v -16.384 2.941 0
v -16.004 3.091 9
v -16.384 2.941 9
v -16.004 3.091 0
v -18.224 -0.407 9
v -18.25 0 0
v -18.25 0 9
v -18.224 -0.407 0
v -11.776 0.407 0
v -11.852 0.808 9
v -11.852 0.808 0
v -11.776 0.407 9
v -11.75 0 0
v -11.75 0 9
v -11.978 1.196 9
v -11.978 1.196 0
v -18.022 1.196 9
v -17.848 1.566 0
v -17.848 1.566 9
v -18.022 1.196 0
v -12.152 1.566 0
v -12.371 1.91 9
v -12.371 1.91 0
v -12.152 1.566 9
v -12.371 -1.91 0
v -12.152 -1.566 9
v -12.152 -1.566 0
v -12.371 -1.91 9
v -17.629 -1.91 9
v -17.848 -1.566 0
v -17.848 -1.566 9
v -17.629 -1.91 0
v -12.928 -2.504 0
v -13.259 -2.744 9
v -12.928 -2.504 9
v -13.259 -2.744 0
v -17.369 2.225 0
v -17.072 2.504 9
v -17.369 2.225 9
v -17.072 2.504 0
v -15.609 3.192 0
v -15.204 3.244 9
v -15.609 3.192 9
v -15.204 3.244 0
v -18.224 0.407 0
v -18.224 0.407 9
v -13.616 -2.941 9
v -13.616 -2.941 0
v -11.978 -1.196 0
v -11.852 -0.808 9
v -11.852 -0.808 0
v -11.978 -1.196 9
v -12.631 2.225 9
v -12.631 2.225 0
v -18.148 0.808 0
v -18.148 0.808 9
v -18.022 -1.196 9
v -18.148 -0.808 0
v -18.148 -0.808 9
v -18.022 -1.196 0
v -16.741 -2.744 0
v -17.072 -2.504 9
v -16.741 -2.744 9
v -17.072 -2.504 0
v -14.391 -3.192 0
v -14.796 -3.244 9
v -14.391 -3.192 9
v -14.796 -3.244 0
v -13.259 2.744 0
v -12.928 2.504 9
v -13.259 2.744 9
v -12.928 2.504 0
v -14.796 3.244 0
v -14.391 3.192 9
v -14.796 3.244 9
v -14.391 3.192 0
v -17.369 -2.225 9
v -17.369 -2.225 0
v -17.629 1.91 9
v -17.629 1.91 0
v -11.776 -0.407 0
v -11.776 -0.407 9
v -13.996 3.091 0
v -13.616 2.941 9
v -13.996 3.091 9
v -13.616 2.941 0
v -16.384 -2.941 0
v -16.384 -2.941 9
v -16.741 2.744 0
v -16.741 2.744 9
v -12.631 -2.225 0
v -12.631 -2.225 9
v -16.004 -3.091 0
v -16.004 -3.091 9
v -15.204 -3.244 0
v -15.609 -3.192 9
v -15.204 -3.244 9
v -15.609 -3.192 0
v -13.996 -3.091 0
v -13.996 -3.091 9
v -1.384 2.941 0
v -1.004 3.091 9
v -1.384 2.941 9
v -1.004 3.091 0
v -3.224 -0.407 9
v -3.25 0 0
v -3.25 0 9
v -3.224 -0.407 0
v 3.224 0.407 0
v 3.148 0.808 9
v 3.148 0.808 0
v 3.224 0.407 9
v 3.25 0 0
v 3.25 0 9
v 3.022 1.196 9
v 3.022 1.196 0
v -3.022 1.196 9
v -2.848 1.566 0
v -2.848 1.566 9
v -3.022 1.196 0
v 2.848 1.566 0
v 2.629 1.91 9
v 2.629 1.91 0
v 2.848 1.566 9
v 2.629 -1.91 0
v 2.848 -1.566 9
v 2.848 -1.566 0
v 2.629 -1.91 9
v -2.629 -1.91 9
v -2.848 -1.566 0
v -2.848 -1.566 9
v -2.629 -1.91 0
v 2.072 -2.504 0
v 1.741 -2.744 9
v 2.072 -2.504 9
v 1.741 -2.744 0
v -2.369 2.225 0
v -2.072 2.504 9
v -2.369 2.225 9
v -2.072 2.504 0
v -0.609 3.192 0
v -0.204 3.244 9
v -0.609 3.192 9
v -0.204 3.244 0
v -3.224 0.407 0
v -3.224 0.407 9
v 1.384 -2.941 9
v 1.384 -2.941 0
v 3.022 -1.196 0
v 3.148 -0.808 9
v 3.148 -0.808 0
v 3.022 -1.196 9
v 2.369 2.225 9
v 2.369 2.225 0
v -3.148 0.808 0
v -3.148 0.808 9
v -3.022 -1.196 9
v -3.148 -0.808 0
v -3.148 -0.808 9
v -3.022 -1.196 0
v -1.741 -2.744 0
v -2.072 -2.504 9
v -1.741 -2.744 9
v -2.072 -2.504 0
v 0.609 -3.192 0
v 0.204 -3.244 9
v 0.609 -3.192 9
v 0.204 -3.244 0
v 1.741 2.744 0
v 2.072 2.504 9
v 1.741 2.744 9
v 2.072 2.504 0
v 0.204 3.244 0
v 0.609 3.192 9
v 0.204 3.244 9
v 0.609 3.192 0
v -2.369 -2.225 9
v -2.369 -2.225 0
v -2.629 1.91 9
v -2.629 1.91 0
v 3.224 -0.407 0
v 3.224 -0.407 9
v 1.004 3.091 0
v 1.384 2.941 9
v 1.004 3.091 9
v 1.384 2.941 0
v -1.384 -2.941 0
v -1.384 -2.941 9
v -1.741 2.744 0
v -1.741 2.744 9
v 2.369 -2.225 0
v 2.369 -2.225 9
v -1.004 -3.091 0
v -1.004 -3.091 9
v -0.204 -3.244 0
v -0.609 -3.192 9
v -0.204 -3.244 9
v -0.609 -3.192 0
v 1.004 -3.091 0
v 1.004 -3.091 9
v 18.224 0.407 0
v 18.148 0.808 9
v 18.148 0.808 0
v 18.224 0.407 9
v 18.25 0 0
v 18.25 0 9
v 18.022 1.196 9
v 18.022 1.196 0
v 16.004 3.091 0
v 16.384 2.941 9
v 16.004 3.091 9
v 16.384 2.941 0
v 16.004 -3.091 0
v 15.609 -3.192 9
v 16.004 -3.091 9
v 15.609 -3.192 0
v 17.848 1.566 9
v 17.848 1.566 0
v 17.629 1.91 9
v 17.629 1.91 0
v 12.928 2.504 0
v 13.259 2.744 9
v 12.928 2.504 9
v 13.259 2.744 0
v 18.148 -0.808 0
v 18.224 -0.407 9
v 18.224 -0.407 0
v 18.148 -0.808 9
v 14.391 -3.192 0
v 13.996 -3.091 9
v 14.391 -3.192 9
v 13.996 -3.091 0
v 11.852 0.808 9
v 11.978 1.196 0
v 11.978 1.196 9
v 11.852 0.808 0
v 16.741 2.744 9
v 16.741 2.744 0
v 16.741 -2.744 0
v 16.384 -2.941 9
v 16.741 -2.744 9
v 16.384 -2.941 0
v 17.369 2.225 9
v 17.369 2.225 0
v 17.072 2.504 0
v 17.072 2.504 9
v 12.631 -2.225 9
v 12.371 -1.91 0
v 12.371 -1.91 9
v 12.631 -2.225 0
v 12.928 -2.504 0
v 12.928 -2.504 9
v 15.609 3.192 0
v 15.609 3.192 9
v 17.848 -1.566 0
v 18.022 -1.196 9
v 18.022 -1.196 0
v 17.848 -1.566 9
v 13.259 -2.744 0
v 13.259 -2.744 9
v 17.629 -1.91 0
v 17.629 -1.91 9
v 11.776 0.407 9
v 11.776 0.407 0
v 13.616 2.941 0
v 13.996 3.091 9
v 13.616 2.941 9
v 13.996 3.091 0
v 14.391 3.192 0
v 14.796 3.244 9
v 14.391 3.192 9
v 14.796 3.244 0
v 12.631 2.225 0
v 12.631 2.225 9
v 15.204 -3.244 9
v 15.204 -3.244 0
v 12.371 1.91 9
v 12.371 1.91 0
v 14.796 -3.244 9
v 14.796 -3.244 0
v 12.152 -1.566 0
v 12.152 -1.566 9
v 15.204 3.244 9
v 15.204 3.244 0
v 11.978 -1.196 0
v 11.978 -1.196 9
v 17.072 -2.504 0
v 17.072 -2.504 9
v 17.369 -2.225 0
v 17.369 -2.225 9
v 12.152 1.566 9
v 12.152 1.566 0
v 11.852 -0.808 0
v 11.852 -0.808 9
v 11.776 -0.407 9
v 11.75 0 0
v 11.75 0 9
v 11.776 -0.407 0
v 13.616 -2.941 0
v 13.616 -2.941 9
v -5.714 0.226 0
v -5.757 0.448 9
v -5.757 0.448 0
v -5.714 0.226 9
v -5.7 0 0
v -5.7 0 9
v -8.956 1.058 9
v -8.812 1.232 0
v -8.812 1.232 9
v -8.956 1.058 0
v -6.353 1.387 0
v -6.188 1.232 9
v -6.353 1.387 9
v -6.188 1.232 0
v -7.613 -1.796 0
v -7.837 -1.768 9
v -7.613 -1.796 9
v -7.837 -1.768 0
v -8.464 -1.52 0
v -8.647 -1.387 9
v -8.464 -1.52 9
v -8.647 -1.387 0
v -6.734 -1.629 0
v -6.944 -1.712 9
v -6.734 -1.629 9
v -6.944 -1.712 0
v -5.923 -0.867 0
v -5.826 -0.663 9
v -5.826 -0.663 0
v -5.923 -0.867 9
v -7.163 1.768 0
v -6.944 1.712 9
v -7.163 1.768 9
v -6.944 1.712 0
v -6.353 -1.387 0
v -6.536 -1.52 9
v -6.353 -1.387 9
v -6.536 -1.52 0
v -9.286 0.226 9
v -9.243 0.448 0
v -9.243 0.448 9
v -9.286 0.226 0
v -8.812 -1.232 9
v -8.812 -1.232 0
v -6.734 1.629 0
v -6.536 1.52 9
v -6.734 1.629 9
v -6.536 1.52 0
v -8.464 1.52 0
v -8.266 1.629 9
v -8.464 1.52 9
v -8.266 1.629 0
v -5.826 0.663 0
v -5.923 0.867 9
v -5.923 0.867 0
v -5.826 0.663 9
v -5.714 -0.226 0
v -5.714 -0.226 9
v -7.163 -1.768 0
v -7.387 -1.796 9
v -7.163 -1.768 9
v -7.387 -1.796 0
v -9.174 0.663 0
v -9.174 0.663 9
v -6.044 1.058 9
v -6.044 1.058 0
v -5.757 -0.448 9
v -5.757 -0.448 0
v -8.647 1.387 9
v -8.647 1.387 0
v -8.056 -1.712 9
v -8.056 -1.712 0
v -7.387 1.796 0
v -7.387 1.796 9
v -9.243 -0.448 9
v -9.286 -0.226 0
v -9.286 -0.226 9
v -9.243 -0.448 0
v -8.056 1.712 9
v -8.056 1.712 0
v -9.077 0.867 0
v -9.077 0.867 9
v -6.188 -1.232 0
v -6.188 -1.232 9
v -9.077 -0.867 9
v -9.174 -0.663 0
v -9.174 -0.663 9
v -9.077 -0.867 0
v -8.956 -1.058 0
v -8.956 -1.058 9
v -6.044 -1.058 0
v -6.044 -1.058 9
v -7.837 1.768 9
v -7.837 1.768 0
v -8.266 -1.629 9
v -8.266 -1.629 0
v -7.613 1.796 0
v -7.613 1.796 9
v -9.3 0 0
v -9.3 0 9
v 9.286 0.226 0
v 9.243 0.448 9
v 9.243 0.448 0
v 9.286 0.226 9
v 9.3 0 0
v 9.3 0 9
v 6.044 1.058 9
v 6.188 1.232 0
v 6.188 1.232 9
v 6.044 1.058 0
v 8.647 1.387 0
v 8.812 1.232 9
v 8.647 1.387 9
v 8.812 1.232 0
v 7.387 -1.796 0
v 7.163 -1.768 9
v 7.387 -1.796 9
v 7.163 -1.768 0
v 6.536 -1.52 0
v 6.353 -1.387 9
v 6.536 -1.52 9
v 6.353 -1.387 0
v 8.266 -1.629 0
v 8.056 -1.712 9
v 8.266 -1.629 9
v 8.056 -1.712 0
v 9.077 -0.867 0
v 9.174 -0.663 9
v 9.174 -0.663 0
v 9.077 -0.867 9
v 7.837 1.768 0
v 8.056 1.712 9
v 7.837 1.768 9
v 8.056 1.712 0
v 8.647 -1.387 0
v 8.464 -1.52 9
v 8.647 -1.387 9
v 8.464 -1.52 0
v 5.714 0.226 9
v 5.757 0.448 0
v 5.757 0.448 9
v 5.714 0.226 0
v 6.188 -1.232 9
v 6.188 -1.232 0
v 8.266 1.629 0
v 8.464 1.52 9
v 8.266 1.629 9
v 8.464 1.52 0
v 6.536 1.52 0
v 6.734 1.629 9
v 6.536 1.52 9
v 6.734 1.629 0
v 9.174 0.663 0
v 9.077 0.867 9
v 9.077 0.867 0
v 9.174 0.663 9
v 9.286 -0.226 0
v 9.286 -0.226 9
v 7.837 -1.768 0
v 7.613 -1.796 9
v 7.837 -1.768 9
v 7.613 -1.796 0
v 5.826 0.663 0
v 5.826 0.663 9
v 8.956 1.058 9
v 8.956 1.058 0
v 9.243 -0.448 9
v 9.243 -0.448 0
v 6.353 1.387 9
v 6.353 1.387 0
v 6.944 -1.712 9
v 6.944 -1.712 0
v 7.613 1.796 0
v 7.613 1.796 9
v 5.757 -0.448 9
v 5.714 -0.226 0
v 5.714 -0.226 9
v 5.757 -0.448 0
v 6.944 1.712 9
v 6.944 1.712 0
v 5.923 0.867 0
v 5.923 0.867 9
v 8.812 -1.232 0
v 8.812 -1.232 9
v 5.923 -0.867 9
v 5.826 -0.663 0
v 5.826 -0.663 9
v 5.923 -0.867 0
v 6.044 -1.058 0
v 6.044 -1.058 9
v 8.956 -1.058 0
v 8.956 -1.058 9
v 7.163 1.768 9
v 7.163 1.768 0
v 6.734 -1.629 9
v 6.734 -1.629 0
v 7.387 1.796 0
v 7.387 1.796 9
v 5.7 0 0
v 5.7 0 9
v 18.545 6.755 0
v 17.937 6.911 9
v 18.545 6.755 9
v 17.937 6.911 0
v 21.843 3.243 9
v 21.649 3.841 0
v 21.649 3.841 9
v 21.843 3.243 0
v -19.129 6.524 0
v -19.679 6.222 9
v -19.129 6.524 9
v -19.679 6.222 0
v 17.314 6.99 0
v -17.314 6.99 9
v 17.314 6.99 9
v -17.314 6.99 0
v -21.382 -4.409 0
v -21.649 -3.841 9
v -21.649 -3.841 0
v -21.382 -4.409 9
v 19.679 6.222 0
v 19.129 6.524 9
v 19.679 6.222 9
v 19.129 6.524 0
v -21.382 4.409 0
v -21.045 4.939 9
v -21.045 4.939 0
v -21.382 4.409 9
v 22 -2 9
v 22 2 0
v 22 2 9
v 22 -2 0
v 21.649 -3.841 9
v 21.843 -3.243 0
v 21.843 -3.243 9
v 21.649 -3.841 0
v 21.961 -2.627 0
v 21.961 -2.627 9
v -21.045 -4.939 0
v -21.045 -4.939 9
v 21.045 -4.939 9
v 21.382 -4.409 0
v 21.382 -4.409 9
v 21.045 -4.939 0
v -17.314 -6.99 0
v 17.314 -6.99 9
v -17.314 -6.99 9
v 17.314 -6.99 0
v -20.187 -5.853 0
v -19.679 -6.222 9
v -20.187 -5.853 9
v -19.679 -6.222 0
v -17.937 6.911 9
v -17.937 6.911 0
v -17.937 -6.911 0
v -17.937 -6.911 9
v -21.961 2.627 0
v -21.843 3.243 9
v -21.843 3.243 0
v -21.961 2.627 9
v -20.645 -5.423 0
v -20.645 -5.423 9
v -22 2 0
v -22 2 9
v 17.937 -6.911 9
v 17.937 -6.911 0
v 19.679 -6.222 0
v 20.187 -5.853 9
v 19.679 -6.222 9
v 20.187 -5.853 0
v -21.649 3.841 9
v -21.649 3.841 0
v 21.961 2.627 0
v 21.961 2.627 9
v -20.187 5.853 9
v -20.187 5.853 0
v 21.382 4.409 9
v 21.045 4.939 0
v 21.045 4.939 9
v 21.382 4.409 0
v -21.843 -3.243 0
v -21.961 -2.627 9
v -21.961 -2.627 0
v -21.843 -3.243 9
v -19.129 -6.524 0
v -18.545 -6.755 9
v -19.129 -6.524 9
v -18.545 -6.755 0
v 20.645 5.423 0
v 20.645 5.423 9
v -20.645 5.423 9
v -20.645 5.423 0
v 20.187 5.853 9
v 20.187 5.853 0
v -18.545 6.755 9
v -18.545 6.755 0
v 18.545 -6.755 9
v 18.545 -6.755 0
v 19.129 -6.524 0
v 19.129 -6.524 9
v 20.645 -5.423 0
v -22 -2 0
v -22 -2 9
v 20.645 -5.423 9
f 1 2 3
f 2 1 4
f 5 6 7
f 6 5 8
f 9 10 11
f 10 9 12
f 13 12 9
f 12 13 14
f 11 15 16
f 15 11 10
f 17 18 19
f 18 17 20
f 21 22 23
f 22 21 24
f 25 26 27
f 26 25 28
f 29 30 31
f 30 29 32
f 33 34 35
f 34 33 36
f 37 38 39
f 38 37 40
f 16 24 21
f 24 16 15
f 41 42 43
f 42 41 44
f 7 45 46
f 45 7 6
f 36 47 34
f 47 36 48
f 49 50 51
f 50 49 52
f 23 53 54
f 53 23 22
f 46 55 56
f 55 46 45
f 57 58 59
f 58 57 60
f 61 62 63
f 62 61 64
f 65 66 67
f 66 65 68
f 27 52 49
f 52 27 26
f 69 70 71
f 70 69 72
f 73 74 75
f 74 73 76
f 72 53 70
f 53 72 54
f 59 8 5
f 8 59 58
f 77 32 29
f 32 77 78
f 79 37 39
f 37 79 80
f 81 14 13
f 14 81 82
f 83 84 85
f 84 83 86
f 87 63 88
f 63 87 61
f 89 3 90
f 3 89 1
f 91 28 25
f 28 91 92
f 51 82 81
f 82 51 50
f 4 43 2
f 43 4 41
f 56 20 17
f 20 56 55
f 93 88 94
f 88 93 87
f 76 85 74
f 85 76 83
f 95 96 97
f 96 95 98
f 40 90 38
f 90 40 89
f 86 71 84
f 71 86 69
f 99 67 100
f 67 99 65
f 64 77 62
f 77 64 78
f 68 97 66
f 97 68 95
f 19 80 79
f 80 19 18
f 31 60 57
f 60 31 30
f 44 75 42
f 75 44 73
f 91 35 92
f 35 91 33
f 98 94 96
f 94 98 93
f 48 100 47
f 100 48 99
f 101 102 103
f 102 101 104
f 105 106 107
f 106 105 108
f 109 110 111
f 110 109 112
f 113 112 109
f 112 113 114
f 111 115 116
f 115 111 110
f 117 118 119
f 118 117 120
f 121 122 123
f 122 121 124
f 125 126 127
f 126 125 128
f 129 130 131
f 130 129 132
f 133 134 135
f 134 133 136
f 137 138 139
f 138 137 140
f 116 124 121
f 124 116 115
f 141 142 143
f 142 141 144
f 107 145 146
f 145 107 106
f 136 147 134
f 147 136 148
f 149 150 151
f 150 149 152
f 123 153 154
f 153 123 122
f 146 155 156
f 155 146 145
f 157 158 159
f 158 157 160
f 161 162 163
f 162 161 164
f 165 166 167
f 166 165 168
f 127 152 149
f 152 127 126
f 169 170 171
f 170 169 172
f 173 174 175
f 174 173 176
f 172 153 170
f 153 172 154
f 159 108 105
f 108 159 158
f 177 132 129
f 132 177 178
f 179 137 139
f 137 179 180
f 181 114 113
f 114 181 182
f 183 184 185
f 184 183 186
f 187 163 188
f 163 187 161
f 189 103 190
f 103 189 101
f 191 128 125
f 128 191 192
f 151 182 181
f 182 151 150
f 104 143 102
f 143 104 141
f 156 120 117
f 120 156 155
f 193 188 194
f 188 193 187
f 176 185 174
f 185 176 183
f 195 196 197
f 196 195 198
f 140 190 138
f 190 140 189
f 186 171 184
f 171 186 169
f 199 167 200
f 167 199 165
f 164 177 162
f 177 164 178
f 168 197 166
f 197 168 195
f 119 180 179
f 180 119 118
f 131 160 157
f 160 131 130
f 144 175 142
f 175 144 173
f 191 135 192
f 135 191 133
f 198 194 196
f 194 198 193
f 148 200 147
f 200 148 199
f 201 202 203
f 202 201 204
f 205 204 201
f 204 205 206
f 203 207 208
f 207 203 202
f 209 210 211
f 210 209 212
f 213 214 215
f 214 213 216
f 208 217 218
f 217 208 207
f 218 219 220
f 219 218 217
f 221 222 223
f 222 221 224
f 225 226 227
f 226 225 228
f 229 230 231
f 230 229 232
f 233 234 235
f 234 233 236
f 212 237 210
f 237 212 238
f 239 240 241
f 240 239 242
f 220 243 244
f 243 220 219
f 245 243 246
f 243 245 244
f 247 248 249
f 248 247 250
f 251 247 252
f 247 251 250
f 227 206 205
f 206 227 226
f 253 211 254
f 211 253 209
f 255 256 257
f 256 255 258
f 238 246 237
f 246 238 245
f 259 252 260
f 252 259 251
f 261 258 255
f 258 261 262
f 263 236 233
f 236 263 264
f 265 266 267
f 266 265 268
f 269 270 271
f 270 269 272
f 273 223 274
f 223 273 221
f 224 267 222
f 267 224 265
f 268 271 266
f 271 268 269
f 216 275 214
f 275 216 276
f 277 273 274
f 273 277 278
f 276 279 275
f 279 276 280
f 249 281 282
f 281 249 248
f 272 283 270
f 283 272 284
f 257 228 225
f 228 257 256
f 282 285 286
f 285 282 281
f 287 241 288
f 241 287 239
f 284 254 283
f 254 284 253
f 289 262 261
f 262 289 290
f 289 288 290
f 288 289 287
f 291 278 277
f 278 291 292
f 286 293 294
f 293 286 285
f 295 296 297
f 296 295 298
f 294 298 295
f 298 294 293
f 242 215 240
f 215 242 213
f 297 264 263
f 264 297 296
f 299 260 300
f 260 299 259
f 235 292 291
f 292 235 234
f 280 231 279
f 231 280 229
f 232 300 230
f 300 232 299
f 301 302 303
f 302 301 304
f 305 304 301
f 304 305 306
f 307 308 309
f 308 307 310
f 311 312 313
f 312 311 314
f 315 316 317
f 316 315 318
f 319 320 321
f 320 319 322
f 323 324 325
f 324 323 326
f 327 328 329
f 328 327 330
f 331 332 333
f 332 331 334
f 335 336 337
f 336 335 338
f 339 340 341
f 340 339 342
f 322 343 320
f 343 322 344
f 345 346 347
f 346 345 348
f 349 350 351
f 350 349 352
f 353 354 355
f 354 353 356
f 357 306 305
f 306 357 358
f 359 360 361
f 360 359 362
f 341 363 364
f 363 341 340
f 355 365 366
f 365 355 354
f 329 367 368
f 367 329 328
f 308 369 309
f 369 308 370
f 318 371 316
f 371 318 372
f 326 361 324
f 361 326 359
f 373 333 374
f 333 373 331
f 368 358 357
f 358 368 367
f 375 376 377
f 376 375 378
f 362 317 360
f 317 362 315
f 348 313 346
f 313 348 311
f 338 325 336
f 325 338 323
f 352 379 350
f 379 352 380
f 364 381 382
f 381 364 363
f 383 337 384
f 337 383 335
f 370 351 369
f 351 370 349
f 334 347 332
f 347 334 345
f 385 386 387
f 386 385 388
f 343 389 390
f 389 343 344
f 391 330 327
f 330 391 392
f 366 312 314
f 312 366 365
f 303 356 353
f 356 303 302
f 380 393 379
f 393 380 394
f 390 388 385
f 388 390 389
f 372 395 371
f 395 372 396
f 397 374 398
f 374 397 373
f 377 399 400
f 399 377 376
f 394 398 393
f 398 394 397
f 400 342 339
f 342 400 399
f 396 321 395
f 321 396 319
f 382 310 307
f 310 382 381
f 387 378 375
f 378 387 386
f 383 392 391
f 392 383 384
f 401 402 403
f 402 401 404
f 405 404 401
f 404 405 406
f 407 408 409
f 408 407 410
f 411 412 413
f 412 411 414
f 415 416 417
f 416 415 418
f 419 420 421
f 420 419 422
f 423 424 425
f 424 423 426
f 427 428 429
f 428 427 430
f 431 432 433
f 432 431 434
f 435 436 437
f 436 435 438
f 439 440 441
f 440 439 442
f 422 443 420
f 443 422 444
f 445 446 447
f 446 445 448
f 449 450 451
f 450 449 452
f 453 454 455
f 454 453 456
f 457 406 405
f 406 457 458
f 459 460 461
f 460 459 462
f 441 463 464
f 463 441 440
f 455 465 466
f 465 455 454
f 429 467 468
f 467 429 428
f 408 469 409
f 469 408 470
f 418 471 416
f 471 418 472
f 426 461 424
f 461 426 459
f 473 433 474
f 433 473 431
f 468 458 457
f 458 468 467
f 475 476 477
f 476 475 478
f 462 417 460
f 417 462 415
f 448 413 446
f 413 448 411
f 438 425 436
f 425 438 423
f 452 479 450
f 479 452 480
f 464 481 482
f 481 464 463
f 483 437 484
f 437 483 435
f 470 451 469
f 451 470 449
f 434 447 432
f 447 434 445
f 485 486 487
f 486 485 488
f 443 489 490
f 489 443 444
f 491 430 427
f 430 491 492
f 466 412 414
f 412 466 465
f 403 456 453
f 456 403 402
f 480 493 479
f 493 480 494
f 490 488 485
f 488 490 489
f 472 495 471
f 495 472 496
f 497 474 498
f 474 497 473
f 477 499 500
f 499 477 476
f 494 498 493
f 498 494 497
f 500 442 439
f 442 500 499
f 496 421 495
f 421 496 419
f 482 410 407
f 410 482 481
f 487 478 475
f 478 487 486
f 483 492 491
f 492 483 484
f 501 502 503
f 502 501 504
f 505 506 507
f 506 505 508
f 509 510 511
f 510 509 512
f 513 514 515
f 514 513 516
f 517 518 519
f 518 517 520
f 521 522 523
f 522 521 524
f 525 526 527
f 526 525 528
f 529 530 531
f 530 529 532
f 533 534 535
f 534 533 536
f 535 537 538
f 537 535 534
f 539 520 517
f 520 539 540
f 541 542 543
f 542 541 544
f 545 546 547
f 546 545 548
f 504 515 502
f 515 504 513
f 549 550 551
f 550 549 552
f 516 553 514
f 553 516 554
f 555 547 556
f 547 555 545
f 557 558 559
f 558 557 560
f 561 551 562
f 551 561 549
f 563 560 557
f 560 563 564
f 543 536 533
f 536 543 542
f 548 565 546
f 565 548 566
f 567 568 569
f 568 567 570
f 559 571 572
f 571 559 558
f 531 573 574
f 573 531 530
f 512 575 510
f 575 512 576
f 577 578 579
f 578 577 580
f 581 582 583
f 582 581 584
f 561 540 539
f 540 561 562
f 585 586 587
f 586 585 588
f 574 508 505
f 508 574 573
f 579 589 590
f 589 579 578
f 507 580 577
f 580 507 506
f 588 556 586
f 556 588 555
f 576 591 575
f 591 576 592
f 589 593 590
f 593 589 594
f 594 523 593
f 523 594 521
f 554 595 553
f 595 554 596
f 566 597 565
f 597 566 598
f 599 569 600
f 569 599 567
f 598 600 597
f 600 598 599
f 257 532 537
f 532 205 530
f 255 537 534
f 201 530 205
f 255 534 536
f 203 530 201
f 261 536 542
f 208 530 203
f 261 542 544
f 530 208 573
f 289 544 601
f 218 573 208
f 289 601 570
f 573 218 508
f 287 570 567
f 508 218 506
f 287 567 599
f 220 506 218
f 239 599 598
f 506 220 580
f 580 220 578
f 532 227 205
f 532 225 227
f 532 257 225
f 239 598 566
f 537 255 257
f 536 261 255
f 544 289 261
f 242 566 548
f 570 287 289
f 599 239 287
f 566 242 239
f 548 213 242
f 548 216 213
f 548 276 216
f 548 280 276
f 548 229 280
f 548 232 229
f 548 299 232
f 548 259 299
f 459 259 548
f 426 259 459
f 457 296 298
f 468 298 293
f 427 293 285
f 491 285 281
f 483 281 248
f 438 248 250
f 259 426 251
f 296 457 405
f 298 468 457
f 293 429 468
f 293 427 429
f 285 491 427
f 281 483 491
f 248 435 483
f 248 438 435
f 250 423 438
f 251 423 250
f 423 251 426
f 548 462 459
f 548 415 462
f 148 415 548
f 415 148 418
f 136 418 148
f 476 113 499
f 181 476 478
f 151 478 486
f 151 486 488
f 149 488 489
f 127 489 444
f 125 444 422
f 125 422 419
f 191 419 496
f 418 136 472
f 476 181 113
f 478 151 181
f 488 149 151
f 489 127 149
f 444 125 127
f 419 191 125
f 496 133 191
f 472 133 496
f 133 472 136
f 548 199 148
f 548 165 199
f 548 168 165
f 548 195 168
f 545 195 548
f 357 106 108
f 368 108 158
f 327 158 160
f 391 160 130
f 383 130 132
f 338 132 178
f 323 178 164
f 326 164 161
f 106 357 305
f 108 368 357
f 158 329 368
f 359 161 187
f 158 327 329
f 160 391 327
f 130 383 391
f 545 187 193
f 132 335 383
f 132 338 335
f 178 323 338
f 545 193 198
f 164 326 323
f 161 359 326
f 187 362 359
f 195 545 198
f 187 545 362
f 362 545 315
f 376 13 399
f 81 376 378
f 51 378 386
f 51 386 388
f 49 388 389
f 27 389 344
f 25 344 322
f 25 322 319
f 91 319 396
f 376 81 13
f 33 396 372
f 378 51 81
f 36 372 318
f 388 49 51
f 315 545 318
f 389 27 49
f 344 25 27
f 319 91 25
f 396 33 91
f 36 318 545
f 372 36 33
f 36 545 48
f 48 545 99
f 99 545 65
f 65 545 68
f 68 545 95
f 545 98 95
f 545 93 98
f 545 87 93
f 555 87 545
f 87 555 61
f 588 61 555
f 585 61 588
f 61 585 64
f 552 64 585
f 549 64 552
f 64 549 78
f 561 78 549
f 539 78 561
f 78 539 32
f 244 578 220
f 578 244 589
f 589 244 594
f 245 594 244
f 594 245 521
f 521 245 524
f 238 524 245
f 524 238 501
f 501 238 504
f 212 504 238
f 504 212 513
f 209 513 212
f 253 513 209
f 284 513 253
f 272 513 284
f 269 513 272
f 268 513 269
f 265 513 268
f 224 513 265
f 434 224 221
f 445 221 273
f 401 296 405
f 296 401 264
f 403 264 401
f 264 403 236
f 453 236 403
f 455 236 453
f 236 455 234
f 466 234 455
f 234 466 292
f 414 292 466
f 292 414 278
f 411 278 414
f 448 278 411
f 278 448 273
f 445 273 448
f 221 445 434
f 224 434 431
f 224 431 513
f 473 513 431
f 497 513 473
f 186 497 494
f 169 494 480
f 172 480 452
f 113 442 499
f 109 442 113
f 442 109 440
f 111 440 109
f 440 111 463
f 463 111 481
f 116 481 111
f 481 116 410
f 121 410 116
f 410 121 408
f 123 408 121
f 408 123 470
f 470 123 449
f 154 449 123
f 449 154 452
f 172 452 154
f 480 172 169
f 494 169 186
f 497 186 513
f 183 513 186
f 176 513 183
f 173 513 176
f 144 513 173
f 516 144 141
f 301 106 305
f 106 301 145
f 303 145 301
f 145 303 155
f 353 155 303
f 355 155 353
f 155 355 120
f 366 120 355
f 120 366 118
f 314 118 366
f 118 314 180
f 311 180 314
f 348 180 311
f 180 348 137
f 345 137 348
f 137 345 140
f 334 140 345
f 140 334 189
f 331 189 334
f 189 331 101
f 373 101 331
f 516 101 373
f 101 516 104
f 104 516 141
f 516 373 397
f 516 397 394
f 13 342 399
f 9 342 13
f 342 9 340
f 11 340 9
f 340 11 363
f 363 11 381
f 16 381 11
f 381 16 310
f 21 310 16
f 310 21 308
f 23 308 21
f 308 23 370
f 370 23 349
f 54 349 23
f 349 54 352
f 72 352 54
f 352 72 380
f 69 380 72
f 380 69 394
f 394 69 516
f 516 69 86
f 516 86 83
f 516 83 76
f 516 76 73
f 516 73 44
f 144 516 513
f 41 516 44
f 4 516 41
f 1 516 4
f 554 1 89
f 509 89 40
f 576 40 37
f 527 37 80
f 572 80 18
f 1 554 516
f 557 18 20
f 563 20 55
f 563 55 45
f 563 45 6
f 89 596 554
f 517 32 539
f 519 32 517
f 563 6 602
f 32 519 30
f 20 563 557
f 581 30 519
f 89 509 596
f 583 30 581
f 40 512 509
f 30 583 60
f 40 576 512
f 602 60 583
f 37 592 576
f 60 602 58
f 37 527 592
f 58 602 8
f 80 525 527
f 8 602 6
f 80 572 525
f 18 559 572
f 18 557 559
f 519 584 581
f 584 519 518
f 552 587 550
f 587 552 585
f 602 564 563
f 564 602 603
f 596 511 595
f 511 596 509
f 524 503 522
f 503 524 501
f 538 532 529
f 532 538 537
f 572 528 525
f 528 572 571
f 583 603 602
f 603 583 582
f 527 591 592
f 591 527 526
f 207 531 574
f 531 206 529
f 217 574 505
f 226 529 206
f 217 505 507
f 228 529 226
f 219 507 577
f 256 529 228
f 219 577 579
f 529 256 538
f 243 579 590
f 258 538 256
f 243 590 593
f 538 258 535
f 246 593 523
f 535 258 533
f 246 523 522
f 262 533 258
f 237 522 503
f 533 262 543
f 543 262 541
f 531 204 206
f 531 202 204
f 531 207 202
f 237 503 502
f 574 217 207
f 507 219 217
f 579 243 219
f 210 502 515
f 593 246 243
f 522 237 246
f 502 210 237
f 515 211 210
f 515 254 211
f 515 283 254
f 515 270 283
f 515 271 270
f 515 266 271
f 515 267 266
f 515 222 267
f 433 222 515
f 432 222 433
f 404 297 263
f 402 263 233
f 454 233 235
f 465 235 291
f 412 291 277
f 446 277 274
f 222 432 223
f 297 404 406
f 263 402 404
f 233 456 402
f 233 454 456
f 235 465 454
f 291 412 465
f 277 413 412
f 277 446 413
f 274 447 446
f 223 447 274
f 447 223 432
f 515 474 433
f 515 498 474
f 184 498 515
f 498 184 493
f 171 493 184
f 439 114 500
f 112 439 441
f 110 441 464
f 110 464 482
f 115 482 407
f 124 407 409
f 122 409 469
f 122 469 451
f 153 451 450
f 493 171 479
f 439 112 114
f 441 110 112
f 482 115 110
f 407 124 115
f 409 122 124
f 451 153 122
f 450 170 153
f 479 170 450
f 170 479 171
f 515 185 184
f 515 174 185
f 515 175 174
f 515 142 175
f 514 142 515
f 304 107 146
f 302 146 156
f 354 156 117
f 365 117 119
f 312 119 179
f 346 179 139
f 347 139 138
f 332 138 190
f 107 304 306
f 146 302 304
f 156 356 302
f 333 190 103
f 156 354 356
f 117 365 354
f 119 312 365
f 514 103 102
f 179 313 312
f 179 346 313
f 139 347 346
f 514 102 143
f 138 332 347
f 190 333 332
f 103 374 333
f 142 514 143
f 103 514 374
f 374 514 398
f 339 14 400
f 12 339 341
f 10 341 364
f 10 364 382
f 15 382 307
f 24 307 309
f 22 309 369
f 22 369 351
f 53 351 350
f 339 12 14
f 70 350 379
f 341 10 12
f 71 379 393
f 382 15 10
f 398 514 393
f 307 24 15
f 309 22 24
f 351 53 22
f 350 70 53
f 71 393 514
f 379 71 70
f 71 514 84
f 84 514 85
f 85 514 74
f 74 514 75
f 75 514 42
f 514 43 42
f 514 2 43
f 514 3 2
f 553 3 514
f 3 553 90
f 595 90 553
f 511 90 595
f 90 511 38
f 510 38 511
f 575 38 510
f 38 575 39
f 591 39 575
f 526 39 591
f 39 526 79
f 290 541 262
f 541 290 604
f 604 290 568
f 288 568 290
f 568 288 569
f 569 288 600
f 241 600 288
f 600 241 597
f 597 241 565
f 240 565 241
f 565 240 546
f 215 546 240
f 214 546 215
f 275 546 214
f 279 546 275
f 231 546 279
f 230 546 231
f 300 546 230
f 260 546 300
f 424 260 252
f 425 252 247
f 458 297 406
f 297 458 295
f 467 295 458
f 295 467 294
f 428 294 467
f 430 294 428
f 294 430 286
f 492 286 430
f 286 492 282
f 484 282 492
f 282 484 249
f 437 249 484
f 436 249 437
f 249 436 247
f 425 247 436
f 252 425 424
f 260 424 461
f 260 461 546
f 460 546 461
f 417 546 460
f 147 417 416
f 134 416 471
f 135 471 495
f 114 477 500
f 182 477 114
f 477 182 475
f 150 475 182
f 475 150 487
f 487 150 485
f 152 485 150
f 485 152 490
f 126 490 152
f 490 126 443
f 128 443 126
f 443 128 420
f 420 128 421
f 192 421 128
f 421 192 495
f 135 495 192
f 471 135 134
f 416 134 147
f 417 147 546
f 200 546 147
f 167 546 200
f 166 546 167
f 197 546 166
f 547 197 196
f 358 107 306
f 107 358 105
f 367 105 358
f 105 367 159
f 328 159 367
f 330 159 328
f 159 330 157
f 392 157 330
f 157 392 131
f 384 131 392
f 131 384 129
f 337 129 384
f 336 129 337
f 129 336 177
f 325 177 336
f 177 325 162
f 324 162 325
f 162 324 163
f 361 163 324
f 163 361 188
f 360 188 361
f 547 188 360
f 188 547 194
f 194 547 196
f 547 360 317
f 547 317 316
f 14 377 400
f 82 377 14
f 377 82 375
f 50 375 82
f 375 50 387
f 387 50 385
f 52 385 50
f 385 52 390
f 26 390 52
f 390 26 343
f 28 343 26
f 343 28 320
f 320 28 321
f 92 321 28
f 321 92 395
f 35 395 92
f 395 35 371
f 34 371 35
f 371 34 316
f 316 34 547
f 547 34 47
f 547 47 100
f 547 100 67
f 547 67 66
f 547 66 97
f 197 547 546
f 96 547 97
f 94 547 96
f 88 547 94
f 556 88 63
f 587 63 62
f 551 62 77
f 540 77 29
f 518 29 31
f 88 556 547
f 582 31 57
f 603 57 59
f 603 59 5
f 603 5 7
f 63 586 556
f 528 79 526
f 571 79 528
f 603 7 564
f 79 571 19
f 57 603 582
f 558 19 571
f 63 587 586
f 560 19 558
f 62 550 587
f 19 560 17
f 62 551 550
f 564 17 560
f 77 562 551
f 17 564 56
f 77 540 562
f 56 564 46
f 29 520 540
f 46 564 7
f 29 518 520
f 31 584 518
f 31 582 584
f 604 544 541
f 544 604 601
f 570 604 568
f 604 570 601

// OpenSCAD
$fn = 50;


difference() {
	union() {
		hull() {
			translate(v = [-17.0000000000, 2.0000000000, 0]) {
				cylinder(h = 9, r = 5);
			}
			translate(v = [17.0000000000, 2.0000000000, 0]) {
				cylinder(h = 9, r = 5);
			}
			translate(v = [-17.0000000000, -2.0000000000, 0]) {
				cylinder(h = 9, r = 5);
			}
			translate(v = [17.0000000000, -2.0000000000, 0]) {
				cylinder(h = 9, r = 5);
			}
		}
	}
	union() {
		translate(v = [-15.0000000000, 0.0000000000, 0]) {
			translate(v = [0, 0, -100]) {
				cylinder(h = 200, r = 3.2500000000);
			}
		}
		translate(v = [0, 0, -100]) {
			cylinder(h = 200, r = 3.2500000000);
		}
		translate(v = [15.0000000000, 0.0000000000, 0]) {
			translate(v = [0, 0, -100]) {
				cylinder(h = 200, r = 3.2500000000);
			}
		}
		translate(v = [-15.0000000000, 0.0000000000, 0]) {
			translate(v = [0, 0, -100]) {
				cylinder(h = 200, r = 1.8000000000);
			}
		}
		translate(v = [-7.5000000000, 0.0000000000, 0]) {
			translate(v = [0, 0, -100]) {
				cylinder(h = 200, r = 1.8000000000);
			}
		}
		translate(v = [0, 0, -100]) {
			cylinder(h = 200, r = 1.8000000000);
		}
		translate(v = [7.5000000000, 0.0000000000, 0]) {
			translate(v = [0, 0, -100]) {
				cylinder(h = 200, r = 1.8000000000);
			}
		}
		translate(v = [15.0000000000, 0.0000000000, 0]) {
			translate(v = [0, 0, -100]) {
				cylinder(h = 200, r = 1.8000000000);
			}
		}
	}
}
